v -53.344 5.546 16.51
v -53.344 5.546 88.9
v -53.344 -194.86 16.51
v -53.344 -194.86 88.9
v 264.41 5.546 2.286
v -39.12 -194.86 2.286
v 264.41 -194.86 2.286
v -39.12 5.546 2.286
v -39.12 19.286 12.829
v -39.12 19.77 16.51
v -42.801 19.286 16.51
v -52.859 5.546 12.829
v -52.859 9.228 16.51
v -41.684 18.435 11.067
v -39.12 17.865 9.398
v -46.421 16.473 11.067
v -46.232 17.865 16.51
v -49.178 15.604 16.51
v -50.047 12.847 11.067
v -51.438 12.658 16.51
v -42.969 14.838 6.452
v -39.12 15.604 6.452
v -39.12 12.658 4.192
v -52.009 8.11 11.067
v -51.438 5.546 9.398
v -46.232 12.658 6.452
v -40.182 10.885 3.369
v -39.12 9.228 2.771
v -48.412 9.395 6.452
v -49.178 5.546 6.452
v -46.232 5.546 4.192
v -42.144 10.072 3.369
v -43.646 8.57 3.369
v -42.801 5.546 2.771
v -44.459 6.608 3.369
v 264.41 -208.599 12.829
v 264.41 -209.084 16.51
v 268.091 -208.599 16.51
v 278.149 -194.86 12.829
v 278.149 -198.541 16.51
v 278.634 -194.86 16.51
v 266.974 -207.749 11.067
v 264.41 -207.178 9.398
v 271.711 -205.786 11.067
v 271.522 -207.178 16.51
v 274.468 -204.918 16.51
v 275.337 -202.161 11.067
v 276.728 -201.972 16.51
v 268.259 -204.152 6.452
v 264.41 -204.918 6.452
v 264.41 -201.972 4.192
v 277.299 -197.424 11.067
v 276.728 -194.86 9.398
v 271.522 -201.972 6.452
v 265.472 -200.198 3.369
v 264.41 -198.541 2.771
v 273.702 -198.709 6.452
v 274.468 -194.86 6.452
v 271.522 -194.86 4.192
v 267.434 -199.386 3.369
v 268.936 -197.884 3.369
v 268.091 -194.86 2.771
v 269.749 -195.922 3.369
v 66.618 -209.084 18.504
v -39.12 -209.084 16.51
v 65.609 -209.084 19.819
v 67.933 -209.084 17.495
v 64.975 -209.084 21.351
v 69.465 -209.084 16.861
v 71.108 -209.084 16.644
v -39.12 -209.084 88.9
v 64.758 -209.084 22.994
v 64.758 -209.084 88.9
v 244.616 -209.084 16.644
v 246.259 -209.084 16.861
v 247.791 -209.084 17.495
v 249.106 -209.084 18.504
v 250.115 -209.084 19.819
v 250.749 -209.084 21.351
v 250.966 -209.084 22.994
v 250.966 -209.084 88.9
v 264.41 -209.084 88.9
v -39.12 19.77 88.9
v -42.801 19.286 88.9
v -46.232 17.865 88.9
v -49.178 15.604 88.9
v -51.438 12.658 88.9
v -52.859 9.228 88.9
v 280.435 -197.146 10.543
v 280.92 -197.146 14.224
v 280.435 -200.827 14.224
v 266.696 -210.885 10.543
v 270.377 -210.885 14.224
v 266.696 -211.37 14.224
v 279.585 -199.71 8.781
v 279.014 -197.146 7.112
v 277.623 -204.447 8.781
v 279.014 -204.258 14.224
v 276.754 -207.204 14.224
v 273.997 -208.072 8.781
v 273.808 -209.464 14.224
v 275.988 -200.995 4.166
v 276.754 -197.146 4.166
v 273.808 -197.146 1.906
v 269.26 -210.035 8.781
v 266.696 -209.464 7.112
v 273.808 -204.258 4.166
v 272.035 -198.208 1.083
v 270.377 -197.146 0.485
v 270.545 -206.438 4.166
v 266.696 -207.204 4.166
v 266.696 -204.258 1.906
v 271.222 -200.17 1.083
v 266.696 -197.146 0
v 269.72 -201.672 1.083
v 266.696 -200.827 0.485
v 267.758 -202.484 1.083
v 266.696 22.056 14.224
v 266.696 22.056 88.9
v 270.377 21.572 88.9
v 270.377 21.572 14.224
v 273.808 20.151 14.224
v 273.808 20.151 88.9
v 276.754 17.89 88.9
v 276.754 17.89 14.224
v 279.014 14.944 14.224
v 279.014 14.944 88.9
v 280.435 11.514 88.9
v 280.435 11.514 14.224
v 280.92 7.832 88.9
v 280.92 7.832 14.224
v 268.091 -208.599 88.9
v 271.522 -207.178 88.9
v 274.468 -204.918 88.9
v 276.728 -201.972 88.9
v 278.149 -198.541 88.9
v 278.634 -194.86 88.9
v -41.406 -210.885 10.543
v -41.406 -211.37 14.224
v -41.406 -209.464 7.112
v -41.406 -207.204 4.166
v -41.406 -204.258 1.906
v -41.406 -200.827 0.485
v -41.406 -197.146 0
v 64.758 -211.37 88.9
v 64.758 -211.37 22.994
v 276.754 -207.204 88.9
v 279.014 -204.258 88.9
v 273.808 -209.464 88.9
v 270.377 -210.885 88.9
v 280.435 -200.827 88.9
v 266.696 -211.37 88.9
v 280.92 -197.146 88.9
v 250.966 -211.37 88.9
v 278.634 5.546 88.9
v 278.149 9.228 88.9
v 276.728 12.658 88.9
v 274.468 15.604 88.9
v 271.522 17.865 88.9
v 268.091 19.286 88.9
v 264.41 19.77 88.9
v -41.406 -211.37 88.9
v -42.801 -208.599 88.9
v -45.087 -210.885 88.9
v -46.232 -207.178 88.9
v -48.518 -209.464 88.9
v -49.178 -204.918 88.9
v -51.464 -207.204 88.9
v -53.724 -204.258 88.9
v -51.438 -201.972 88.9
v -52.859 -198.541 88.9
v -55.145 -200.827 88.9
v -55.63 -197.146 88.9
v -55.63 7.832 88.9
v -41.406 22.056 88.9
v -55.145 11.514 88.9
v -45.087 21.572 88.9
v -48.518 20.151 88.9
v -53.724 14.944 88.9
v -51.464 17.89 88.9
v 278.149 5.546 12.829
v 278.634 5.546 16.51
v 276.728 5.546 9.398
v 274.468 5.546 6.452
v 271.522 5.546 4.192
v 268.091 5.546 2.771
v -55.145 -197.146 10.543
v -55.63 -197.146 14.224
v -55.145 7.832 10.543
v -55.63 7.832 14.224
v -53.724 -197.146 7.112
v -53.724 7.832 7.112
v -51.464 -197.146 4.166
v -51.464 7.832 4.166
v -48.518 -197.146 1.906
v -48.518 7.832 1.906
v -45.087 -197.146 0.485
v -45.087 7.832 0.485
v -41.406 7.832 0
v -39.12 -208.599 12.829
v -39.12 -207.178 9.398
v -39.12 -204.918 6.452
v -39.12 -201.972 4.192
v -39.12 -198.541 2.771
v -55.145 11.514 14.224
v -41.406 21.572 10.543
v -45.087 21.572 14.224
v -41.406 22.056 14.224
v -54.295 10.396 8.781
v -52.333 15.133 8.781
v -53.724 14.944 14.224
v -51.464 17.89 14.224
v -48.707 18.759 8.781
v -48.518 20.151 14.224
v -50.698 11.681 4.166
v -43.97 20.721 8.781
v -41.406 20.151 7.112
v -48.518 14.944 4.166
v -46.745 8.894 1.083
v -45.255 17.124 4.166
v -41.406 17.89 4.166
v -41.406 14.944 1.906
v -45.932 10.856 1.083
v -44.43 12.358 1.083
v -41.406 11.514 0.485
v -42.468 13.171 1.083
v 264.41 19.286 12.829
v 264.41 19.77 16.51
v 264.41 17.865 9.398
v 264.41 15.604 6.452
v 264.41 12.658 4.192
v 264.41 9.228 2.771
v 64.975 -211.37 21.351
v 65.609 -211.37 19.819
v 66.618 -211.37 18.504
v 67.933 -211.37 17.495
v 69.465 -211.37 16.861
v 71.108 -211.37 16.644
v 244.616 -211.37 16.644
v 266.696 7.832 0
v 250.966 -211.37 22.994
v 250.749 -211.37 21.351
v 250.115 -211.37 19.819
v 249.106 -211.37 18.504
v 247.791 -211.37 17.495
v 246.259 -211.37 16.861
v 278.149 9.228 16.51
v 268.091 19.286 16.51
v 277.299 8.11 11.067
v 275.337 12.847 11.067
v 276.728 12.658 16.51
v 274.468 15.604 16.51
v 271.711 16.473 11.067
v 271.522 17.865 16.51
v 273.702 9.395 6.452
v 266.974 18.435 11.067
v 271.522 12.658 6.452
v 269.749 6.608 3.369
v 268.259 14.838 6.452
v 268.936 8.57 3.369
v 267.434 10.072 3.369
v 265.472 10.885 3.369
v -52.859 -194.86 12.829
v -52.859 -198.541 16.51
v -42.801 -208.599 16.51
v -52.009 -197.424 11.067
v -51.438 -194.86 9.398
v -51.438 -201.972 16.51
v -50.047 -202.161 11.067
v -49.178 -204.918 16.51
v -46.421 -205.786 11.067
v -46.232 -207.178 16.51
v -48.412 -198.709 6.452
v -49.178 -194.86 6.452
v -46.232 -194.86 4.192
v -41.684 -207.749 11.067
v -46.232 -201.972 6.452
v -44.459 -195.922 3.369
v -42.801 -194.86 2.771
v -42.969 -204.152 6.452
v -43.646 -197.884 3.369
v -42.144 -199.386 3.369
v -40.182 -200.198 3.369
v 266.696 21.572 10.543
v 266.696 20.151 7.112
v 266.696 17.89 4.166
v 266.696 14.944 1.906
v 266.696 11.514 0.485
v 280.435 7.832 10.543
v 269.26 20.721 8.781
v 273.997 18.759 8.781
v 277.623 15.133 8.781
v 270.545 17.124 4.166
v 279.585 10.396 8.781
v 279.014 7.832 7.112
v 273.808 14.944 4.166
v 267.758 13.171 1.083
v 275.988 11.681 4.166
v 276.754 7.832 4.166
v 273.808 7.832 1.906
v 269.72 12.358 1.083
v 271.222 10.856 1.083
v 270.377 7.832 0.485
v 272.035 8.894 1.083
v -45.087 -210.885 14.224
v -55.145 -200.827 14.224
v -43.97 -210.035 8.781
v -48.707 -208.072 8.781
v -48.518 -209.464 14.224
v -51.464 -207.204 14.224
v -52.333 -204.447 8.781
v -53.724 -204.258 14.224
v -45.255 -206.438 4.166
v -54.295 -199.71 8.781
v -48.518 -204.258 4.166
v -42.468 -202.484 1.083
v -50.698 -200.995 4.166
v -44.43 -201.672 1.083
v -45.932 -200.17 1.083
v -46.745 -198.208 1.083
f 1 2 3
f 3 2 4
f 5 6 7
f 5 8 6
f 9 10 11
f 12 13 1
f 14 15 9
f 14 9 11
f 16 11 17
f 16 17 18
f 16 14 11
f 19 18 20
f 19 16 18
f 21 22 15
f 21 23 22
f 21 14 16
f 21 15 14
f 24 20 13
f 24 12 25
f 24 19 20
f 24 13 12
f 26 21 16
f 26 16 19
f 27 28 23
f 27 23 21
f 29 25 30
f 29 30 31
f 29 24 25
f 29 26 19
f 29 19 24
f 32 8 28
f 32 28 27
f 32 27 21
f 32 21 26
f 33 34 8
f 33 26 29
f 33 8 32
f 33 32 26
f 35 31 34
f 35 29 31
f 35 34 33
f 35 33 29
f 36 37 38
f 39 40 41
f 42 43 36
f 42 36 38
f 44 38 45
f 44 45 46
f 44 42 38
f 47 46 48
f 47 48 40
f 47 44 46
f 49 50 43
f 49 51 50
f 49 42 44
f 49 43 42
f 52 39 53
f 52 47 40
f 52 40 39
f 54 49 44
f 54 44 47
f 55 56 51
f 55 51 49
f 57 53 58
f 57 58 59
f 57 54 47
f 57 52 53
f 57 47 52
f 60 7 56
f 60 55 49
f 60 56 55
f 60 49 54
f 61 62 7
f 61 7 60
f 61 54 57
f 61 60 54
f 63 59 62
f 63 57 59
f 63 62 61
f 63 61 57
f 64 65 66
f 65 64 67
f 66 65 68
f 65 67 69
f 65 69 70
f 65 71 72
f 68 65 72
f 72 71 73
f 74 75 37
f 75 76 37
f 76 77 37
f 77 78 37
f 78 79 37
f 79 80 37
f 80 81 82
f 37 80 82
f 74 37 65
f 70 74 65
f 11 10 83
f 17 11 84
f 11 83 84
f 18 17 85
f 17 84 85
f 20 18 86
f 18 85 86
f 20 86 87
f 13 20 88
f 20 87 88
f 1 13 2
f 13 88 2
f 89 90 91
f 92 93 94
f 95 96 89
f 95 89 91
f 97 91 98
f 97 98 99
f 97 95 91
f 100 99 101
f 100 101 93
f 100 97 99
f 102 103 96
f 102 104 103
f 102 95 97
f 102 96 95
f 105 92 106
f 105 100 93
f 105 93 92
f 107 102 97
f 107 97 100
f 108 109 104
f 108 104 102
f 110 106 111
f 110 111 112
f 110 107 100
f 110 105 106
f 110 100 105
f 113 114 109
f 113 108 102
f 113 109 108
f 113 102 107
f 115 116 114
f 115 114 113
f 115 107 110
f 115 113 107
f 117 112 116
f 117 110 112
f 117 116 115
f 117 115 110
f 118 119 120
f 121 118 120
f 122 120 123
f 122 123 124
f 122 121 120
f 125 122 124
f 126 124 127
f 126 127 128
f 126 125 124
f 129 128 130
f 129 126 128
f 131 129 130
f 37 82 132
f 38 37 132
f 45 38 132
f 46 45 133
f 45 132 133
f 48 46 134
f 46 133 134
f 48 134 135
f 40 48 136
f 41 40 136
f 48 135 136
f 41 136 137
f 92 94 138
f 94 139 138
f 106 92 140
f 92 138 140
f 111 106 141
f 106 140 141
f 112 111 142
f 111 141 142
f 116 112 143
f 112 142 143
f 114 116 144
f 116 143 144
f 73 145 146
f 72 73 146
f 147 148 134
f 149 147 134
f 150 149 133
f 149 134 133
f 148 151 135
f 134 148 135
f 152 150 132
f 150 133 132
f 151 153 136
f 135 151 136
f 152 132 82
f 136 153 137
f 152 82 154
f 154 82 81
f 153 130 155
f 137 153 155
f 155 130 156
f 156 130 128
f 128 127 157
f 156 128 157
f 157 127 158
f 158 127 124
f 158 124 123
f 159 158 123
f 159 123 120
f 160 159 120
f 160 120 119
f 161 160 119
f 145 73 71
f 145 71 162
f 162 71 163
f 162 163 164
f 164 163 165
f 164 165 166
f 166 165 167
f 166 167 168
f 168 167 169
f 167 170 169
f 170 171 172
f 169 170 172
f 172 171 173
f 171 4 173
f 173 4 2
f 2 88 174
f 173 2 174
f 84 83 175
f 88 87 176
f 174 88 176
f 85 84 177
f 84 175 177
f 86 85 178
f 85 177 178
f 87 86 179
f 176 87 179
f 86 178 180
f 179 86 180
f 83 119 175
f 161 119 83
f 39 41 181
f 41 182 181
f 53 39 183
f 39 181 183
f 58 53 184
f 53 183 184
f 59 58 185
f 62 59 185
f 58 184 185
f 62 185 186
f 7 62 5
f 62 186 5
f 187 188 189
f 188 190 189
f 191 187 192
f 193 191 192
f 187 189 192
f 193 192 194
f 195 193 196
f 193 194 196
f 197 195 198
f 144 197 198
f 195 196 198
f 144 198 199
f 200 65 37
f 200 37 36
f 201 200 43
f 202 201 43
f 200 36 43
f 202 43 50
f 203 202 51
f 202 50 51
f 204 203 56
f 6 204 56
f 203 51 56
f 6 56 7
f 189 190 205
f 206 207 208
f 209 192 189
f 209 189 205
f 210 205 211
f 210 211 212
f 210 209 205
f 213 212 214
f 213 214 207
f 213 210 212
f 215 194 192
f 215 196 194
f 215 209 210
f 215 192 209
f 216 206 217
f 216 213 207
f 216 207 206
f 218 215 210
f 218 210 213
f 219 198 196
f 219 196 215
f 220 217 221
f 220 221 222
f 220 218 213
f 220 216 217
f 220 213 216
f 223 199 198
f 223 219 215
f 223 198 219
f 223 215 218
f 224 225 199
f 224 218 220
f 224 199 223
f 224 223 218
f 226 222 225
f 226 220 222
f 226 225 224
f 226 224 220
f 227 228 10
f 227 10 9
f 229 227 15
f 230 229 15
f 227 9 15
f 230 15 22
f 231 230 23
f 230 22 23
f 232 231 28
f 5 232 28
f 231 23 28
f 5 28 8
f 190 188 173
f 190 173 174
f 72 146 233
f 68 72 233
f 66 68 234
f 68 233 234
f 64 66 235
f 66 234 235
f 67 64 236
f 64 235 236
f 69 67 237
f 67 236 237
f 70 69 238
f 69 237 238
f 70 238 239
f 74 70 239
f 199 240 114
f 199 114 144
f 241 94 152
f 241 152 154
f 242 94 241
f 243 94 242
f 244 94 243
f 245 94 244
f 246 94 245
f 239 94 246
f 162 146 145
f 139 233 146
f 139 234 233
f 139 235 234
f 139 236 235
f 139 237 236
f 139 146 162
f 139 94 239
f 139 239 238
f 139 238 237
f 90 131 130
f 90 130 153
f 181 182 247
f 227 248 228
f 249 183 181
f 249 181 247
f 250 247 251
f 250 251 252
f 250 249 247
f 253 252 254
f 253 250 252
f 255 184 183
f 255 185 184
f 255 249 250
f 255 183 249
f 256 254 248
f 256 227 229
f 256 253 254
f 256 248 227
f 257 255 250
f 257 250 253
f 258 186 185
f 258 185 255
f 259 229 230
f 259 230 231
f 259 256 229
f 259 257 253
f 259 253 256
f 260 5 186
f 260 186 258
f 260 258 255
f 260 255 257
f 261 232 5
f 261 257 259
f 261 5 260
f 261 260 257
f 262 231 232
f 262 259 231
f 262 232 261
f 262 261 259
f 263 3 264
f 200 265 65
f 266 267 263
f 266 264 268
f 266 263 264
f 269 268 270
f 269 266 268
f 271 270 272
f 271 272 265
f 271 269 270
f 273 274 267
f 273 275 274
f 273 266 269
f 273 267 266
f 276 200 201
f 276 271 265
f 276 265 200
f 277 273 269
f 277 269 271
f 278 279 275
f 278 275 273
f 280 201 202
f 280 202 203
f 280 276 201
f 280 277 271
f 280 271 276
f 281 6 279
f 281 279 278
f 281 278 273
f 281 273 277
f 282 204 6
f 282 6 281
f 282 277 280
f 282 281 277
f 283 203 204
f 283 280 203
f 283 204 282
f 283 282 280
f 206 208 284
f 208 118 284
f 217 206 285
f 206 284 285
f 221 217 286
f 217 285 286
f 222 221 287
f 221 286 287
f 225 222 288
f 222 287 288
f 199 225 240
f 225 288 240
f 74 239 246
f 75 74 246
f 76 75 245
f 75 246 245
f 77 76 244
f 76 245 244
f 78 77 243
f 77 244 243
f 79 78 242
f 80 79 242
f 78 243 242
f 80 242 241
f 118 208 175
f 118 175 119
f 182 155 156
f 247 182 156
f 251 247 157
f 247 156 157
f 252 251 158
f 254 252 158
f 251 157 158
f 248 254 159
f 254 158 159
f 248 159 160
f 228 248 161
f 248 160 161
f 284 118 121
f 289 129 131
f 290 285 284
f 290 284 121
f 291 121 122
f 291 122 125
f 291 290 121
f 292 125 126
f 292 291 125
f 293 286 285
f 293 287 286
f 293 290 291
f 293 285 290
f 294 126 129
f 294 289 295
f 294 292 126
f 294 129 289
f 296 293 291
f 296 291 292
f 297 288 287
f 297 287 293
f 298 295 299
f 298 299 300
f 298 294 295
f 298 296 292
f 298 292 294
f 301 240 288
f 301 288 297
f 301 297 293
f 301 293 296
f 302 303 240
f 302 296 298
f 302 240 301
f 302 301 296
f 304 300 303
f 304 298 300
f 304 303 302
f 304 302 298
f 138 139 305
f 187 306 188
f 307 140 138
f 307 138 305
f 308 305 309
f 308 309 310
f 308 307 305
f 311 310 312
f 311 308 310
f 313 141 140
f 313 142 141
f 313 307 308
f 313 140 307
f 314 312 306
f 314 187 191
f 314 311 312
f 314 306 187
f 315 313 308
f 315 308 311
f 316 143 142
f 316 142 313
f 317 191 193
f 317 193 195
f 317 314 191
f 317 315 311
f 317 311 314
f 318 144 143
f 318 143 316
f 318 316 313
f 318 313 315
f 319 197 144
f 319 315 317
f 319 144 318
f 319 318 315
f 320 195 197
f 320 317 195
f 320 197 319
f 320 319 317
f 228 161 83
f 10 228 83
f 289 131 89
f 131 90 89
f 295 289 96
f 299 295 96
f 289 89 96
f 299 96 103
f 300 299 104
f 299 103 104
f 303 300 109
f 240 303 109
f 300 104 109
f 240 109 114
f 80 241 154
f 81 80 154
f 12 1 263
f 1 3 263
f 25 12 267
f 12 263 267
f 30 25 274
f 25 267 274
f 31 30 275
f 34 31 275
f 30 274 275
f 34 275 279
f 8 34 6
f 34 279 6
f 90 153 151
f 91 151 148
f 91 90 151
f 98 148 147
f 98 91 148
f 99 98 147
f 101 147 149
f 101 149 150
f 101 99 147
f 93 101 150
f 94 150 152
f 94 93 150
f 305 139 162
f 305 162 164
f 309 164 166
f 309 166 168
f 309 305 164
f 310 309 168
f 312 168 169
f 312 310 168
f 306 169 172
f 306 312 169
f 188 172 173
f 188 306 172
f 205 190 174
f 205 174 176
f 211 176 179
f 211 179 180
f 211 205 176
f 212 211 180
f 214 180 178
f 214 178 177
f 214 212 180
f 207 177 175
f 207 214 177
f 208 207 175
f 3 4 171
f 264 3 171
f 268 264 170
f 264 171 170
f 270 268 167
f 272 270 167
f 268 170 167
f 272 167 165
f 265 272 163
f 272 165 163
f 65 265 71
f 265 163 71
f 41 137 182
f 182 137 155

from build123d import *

# Parameters (mm, degrees)
BOSS_EXTRUDE1_DEPTH = 88.9
CUT_EXTRUDE1_DEPTH  = 86.614
FILLET1_R           = 14.224
FILLET2_R           = 14.224
CUT_EXTRUDE2_DEPTH  = 2.286


with BuildPart() as part:
    # Sketch1 → Boss-Extrude1 (new body)
    with BuildSketch(Plane.XY):
        with BuildLine():
            Line((-41.405944168, 22.056216238), (266.696055832, 22.056216238))
            ThreePointArc((266.696055832, 22.056216238), (276.753942688, 17.890103094), (280.920055832, 7.832216238))
            Line((280.920055832, 7.832216238), (280.920055832, -197.145783762))
            ThreePointArc((280.920055832, -197.145783762), (276.753942688, -207.203670617), (266.696055832, -211.369783762))
            Line((266.696055832, -211.369783762), (-41.405944168, -211.369783762))
            ThreePointArc((-41.405944168, -211.369783762), (-51.463831024, -207.203670617), (-55.629944168, -197.145783762))
            Line((-55.629944168, -197.145783762), (-55.629944168, 7.832216238))
            ThreePointArc((-55.629944168, 7.832216238), (-51.463831024, 17.890103094), (-41.405944168, 22.056216238))
        make_face()
    extrude(amount=BOSS_EXTRUDE1_DEPTH)

    # Sketch4 → Cut-Extrude1 (cut)
    with BuildSketch(Plane.XY.offset(88.9)):
        with BuildLine():
            Line((-39.119944168, -209.083783762), (264.410055832, -209.083783762))
            ThreePointArc((264.410055832, -209.083783762), (274.467942688, -204.917670617), (278.634055832, -194.859783762))
            Line((278.634055832, -194.859783762), (278.634055832, 5.546216238))
            ThreePointArc((278.634055832, 5.546216238), (274.467942688, 15.604103094), (264.410055832, 19.770216238))
            Line((264.410055832, 19.770216238), (-39.119944168, 19.770216238))
            ThreePointArc((-39.119944168, 19.770216238), (-49.177831024, 15.604103094), (-53.343944168, 5.546216238))
            Line((-53.343944168, 5.546216238), (-53.343944168, -194.859783762))
            ThreePointArc((-53.343944168, -194.859783762), (-49.177831024, -204.917670617), (-39.119944168, -209.083783762))
        make_face()
    extrude(amount=-CUT_EXTRUDE1_DEPTH, mode=Mode.SUBTRACT)

    # Fillet1
    fillet1_edges = [part.edges().sort_by_distance(p)[0] for p in [
        (-49.177831024, -204.917670617, 2.286),
        (-53.343944168, -94.656783762, 2.286),
        (-49.177831024, 15.604103094, 2.286),
        (112.645055832, 19.770216238, 2.286),
        (274.467942688, 15.604103094, 2.286),
        (278.634055832, -94.656783762, 2.286),
        (274.467942688, -204.917670617, 2.286),
        (112.645055832, -209.083783762, 2.286),
    ]]
    fillet(fillet1_edges, radius=FILLET1_R)

    # Fillet2
    fillet2_edges = [part.edges().sort_by_distance(p)[0] for p in [
        (-55.629944168, -94.656783762, 0),
        (-51.463831024, 17.890103094, 0),
        (112.645055832, 22.056216238, 0),
        (276.753942688, 17.890103094, 0),
        (280.920055832, -94.656783762, 0),
        (276.753942688, -207.203670617, 0),
        (112.645055832, -211.369783762, 0),
        (-51.463831024, -207.203670617, 0),
    ]]
    fillet(fillet2_edges, radius=FILLET2_R)

    # Sketch5 → Cut-Extrude2 (cut)
    with BuildSketch(Plane(origin=(0, -211.369783762, 0), x_dir=(-1, 0, 0), z_dir=(0, -1, 0))):
        with BuildLine():
            Line((-64.758151491, -88.9), (-64.758151491, -22.994419779))
            ThreePointArc((-64.758151491, -22.994419779), (-66.61802343, -18.504291719), (-71.108151491, -16.644419779))
            Line((-71.108151491, -16.644419779), (-244.615767903, -16.644419779))
            ThreePointArc((-244.615767903, -16.644419779), (-249.105895963, -18.504291719), (-250.965767903, -22.994419779))
            Line((-250.965767903, -22.994419779), (-250.965767903, -88.9))
            Line((-250.965767903, -88.9), (-64.758151491, -88.9))
        make_face()
    extrude(amount=-CUT_EXTRUDE2_DEPTH, mode=Mode.SUBTRACT)


solid = part.part
